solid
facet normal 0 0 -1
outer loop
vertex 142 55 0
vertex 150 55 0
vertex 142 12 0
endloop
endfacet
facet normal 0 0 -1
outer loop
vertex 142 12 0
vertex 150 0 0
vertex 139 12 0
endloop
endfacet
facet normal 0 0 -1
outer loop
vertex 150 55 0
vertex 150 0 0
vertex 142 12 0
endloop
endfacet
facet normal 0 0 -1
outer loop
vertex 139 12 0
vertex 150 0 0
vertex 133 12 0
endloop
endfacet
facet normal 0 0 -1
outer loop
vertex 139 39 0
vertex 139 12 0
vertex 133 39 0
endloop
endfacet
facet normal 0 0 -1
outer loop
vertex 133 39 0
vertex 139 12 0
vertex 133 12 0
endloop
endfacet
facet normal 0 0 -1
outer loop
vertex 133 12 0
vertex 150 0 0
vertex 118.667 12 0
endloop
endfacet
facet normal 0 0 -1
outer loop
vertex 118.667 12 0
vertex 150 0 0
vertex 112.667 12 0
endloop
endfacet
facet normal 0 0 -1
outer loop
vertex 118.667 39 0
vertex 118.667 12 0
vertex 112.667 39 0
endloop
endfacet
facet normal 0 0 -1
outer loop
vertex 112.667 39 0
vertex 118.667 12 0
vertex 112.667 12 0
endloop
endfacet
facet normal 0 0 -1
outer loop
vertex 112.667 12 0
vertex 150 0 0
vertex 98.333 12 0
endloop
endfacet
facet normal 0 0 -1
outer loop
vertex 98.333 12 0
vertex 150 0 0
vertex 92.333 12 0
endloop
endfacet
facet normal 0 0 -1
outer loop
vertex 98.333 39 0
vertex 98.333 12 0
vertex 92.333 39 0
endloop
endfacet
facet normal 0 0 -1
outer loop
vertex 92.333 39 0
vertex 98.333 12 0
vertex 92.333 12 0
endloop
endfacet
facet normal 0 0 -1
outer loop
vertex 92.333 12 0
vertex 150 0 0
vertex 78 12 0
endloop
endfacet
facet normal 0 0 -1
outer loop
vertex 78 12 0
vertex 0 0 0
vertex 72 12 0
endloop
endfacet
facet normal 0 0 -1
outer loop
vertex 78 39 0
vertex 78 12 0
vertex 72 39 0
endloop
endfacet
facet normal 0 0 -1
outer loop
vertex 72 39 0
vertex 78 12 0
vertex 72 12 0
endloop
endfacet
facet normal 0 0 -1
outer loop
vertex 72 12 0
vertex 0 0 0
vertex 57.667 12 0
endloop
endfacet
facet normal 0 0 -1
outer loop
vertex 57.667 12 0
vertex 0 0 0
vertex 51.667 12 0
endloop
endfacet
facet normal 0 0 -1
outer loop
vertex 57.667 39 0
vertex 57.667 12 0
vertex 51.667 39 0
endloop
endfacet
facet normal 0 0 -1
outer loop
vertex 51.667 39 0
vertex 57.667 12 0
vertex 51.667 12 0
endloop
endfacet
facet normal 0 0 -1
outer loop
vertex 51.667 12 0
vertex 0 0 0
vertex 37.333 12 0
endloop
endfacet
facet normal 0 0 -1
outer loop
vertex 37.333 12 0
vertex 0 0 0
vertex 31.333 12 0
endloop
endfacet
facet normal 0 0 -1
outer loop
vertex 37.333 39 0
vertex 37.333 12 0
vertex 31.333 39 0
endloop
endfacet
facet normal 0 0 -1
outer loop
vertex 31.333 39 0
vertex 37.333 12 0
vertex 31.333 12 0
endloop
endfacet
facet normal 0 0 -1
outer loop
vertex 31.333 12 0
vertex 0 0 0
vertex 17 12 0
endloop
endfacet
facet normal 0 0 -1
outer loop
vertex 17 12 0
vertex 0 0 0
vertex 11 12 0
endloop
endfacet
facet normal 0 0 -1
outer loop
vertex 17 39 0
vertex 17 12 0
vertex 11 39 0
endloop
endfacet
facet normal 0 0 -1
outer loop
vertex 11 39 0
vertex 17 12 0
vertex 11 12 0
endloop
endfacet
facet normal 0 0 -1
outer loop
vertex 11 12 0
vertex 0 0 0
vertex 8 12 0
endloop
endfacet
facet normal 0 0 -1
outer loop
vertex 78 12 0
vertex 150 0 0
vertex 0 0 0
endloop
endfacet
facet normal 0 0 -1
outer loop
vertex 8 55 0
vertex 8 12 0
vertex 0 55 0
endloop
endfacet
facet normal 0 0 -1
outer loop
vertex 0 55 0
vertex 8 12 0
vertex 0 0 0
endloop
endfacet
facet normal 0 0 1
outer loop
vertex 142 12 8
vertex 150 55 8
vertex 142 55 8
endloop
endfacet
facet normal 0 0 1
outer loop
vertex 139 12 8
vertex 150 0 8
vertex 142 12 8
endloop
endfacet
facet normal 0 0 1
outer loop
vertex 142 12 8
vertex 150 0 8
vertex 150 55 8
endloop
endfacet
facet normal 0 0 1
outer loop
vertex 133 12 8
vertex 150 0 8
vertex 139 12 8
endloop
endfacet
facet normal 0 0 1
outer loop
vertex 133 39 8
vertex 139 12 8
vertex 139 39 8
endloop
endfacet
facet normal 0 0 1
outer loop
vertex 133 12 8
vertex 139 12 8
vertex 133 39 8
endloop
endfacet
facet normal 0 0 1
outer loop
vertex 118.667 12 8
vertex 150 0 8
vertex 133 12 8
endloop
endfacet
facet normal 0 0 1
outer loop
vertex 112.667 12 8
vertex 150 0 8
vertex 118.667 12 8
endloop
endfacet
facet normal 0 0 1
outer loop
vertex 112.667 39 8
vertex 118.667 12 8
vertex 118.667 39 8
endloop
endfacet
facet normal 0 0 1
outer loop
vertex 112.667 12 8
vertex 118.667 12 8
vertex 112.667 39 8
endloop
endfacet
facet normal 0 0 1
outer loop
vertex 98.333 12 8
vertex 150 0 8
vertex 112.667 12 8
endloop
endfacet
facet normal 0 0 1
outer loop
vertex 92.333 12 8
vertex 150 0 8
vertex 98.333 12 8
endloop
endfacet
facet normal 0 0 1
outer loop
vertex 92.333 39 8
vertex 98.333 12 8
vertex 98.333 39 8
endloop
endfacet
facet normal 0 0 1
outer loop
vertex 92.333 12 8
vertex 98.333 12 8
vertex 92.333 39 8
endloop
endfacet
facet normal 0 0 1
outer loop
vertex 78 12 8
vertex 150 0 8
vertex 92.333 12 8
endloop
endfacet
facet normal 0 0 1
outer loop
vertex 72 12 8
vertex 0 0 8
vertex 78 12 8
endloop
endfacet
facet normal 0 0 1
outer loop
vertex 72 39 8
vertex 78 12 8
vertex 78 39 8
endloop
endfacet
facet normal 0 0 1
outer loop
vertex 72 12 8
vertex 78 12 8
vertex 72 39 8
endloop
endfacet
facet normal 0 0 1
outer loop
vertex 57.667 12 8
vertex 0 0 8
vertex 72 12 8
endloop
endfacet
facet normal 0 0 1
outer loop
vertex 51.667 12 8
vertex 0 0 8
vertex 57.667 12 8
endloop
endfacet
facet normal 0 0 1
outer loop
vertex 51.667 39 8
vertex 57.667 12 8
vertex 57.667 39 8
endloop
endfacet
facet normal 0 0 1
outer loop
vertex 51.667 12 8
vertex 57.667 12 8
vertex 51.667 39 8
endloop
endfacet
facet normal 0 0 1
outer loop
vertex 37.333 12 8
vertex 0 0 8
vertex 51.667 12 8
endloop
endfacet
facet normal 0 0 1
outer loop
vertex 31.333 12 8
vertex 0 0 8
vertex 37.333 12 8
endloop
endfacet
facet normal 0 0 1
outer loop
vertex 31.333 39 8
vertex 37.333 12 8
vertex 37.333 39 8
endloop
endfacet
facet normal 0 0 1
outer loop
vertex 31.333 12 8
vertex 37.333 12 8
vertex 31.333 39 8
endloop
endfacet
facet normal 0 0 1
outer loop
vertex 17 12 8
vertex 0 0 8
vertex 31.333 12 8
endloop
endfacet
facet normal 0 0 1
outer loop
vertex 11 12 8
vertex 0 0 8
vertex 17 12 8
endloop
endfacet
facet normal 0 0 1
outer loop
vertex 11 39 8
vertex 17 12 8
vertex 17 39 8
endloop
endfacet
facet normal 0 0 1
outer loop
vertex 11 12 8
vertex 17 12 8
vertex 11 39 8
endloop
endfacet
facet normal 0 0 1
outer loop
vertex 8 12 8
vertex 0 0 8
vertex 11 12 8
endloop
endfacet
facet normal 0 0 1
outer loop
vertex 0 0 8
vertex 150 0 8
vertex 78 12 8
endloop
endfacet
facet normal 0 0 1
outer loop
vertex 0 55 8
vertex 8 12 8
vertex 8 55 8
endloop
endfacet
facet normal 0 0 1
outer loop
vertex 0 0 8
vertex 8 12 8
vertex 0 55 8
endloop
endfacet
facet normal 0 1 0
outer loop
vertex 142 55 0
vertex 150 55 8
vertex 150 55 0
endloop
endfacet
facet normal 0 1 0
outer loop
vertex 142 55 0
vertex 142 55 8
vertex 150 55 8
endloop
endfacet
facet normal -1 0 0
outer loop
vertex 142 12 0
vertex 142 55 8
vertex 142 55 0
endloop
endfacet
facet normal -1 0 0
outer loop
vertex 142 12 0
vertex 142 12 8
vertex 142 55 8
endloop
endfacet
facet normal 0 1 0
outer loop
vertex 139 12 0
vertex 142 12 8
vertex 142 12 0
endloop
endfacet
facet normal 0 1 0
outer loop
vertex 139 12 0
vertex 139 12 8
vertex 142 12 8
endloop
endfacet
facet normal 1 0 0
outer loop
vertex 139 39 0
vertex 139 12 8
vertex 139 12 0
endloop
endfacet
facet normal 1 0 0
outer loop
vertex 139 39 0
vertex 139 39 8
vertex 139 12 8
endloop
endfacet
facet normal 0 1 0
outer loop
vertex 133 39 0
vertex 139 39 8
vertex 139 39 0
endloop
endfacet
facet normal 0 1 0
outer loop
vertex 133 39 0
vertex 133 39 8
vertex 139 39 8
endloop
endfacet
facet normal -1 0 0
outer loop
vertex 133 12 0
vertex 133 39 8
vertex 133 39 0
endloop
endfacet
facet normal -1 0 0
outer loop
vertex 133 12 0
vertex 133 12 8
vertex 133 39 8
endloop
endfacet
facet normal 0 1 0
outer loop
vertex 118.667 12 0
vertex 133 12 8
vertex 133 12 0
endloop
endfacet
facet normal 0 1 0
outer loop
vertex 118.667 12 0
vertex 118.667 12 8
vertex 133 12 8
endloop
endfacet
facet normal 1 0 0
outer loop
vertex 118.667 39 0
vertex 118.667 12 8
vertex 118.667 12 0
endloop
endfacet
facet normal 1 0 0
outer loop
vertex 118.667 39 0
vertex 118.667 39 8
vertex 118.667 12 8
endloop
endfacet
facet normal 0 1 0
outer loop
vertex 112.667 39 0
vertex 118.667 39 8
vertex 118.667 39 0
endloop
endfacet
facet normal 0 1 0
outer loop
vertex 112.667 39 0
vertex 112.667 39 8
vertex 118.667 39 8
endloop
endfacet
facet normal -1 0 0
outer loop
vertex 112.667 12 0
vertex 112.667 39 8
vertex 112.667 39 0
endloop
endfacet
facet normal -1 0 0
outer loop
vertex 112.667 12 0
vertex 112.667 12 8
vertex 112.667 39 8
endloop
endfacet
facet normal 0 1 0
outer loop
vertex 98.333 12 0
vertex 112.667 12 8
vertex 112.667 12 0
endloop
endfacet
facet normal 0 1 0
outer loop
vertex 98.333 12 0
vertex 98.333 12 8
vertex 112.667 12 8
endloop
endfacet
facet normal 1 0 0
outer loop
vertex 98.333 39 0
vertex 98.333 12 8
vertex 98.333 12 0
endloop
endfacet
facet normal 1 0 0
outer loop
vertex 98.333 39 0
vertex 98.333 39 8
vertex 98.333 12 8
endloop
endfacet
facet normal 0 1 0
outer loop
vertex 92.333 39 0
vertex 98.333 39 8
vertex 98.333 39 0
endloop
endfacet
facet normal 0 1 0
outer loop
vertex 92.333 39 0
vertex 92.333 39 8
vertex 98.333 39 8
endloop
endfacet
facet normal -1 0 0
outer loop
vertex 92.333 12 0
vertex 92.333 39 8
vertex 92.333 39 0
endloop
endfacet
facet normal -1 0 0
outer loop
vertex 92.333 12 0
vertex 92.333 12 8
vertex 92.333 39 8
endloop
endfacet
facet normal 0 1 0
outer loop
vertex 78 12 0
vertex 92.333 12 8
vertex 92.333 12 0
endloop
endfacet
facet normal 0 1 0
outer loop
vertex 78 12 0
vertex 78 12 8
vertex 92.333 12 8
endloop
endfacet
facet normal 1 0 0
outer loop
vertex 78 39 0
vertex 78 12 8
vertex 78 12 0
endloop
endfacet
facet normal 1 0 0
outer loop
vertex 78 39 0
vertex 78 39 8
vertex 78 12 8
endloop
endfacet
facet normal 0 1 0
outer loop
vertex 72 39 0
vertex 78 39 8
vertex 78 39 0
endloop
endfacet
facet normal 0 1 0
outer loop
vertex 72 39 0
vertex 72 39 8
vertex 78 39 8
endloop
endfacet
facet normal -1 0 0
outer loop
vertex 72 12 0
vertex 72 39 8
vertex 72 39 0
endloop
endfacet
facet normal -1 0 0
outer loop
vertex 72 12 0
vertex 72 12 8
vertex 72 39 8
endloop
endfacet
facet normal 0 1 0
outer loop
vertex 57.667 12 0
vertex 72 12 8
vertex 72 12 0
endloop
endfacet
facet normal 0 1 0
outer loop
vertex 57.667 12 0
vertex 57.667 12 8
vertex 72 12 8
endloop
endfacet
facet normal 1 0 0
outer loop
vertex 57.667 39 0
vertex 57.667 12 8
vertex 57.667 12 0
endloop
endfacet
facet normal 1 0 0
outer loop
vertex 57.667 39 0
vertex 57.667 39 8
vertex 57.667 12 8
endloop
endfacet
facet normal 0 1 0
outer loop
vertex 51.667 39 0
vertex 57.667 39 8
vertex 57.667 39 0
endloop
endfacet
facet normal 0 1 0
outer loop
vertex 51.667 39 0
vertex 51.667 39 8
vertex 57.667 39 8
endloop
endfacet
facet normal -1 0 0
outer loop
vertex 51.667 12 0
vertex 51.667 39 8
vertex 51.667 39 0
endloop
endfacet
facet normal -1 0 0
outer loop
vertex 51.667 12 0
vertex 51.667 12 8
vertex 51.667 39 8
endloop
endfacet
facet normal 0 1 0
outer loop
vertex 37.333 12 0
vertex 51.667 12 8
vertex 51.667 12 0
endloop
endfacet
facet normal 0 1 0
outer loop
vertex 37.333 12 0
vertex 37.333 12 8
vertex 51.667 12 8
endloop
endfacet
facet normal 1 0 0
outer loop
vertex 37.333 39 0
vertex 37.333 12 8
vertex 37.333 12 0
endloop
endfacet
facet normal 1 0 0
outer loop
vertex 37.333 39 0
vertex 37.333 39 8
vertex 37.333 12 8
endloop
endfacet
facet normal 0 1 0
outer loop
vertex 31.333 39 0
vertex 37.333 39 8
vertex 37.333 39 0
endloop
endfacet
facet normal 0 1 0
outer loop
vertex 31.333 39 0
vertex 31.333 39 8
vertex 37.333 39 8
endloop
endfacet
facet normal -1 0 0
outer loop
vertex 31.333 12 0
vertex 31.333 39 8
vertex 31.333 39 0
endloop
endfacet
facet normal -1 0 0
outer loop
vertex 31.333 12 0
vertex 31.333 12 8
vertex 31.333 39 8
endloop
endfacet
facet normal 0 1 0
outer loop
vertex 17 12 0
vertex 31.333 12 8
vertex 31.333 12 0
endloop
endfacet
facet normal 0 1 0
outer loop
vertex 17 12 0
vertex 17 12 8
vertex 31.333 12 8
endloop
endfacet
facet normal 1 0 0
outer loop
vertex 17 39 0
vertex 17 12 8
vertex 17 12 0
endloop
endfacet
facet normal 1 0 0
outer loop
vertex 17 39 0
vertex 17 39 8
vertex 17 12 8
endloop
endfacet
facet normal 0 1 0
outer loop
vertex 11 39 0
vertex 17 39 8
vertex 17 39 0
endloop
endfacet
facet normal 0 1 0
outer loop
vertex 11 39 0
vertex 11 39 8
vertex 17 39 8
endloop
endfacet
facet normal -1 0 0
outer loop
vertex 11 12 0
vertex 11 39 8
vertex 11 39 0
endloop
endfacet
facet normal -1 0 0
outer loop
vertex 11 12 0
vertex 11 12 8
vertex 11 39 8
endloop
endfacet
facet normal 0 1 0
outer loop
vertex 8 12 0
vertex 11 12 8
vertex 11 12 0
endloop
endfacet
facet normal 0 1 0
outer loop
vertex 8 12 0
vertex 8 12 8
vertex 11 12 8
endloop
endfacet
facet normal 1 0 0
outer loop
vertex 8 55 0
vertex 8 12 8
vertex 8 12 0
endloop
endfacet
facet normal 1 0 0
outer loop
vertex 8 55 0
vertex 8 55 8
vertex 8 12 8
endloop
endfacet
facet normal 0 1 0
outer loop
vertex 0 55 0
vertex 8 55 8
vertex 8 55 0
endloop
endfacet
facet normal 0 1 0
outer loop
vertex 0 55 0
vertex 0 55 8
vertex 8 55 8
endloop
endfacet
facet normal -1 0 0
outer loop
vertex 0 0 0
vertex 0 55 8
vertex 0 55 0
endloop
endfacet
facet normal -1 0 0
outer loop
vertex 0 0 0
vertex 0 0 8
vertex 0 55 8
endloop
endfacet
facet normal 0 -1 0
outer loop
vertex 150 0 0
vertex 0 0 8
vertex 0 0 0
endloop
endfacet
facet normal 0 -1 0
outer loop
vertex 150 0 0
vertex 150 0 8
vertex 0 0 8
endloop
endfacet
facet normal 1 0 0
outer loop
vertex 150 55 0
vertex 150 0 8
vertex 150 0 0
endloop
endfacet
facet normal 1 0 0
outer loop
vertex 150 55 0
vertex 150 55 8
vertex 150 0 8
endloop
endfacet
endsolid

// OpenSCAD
$fn = 32;

// ----------------------------------------------------------------------
// Guard grille: 7 slats over a 150 x 55 mm plate
// ----------------------------------------------------------------------

// --- parameters (mm) ---
profile_height = 8;       // extrusion height
profile_points = 36;      // points of the closed outline

profile = [[0, 0], [150, 0], [150, 55], [142, 55], [142, 12], [139, 12], [139, 39], [133, 39], [133, 12], [118.667, 12], [118.667, 39], [112.667, 39], [112.667, 12], [98.333, 12], [98.333, 39], [92.333, 39], [92.333, 12], [78, 12], [78, 39], [72, 39], [72, 12], [57.667, 12], [57.667, 39], [51.667, 39], [51.667, 12], [37.333, 12], [37.333, 39], [31.333, 39], [31.333, 12], [17, 12], [17, 39], [11, 39], [11, 12], [8, 12], [8, 55], [0, 55]];  // single closed polygon, 36 points, counter clockwise

// --- the one profile operation ---
linear_extrude(height = profile_height) polygon(points = profile);
